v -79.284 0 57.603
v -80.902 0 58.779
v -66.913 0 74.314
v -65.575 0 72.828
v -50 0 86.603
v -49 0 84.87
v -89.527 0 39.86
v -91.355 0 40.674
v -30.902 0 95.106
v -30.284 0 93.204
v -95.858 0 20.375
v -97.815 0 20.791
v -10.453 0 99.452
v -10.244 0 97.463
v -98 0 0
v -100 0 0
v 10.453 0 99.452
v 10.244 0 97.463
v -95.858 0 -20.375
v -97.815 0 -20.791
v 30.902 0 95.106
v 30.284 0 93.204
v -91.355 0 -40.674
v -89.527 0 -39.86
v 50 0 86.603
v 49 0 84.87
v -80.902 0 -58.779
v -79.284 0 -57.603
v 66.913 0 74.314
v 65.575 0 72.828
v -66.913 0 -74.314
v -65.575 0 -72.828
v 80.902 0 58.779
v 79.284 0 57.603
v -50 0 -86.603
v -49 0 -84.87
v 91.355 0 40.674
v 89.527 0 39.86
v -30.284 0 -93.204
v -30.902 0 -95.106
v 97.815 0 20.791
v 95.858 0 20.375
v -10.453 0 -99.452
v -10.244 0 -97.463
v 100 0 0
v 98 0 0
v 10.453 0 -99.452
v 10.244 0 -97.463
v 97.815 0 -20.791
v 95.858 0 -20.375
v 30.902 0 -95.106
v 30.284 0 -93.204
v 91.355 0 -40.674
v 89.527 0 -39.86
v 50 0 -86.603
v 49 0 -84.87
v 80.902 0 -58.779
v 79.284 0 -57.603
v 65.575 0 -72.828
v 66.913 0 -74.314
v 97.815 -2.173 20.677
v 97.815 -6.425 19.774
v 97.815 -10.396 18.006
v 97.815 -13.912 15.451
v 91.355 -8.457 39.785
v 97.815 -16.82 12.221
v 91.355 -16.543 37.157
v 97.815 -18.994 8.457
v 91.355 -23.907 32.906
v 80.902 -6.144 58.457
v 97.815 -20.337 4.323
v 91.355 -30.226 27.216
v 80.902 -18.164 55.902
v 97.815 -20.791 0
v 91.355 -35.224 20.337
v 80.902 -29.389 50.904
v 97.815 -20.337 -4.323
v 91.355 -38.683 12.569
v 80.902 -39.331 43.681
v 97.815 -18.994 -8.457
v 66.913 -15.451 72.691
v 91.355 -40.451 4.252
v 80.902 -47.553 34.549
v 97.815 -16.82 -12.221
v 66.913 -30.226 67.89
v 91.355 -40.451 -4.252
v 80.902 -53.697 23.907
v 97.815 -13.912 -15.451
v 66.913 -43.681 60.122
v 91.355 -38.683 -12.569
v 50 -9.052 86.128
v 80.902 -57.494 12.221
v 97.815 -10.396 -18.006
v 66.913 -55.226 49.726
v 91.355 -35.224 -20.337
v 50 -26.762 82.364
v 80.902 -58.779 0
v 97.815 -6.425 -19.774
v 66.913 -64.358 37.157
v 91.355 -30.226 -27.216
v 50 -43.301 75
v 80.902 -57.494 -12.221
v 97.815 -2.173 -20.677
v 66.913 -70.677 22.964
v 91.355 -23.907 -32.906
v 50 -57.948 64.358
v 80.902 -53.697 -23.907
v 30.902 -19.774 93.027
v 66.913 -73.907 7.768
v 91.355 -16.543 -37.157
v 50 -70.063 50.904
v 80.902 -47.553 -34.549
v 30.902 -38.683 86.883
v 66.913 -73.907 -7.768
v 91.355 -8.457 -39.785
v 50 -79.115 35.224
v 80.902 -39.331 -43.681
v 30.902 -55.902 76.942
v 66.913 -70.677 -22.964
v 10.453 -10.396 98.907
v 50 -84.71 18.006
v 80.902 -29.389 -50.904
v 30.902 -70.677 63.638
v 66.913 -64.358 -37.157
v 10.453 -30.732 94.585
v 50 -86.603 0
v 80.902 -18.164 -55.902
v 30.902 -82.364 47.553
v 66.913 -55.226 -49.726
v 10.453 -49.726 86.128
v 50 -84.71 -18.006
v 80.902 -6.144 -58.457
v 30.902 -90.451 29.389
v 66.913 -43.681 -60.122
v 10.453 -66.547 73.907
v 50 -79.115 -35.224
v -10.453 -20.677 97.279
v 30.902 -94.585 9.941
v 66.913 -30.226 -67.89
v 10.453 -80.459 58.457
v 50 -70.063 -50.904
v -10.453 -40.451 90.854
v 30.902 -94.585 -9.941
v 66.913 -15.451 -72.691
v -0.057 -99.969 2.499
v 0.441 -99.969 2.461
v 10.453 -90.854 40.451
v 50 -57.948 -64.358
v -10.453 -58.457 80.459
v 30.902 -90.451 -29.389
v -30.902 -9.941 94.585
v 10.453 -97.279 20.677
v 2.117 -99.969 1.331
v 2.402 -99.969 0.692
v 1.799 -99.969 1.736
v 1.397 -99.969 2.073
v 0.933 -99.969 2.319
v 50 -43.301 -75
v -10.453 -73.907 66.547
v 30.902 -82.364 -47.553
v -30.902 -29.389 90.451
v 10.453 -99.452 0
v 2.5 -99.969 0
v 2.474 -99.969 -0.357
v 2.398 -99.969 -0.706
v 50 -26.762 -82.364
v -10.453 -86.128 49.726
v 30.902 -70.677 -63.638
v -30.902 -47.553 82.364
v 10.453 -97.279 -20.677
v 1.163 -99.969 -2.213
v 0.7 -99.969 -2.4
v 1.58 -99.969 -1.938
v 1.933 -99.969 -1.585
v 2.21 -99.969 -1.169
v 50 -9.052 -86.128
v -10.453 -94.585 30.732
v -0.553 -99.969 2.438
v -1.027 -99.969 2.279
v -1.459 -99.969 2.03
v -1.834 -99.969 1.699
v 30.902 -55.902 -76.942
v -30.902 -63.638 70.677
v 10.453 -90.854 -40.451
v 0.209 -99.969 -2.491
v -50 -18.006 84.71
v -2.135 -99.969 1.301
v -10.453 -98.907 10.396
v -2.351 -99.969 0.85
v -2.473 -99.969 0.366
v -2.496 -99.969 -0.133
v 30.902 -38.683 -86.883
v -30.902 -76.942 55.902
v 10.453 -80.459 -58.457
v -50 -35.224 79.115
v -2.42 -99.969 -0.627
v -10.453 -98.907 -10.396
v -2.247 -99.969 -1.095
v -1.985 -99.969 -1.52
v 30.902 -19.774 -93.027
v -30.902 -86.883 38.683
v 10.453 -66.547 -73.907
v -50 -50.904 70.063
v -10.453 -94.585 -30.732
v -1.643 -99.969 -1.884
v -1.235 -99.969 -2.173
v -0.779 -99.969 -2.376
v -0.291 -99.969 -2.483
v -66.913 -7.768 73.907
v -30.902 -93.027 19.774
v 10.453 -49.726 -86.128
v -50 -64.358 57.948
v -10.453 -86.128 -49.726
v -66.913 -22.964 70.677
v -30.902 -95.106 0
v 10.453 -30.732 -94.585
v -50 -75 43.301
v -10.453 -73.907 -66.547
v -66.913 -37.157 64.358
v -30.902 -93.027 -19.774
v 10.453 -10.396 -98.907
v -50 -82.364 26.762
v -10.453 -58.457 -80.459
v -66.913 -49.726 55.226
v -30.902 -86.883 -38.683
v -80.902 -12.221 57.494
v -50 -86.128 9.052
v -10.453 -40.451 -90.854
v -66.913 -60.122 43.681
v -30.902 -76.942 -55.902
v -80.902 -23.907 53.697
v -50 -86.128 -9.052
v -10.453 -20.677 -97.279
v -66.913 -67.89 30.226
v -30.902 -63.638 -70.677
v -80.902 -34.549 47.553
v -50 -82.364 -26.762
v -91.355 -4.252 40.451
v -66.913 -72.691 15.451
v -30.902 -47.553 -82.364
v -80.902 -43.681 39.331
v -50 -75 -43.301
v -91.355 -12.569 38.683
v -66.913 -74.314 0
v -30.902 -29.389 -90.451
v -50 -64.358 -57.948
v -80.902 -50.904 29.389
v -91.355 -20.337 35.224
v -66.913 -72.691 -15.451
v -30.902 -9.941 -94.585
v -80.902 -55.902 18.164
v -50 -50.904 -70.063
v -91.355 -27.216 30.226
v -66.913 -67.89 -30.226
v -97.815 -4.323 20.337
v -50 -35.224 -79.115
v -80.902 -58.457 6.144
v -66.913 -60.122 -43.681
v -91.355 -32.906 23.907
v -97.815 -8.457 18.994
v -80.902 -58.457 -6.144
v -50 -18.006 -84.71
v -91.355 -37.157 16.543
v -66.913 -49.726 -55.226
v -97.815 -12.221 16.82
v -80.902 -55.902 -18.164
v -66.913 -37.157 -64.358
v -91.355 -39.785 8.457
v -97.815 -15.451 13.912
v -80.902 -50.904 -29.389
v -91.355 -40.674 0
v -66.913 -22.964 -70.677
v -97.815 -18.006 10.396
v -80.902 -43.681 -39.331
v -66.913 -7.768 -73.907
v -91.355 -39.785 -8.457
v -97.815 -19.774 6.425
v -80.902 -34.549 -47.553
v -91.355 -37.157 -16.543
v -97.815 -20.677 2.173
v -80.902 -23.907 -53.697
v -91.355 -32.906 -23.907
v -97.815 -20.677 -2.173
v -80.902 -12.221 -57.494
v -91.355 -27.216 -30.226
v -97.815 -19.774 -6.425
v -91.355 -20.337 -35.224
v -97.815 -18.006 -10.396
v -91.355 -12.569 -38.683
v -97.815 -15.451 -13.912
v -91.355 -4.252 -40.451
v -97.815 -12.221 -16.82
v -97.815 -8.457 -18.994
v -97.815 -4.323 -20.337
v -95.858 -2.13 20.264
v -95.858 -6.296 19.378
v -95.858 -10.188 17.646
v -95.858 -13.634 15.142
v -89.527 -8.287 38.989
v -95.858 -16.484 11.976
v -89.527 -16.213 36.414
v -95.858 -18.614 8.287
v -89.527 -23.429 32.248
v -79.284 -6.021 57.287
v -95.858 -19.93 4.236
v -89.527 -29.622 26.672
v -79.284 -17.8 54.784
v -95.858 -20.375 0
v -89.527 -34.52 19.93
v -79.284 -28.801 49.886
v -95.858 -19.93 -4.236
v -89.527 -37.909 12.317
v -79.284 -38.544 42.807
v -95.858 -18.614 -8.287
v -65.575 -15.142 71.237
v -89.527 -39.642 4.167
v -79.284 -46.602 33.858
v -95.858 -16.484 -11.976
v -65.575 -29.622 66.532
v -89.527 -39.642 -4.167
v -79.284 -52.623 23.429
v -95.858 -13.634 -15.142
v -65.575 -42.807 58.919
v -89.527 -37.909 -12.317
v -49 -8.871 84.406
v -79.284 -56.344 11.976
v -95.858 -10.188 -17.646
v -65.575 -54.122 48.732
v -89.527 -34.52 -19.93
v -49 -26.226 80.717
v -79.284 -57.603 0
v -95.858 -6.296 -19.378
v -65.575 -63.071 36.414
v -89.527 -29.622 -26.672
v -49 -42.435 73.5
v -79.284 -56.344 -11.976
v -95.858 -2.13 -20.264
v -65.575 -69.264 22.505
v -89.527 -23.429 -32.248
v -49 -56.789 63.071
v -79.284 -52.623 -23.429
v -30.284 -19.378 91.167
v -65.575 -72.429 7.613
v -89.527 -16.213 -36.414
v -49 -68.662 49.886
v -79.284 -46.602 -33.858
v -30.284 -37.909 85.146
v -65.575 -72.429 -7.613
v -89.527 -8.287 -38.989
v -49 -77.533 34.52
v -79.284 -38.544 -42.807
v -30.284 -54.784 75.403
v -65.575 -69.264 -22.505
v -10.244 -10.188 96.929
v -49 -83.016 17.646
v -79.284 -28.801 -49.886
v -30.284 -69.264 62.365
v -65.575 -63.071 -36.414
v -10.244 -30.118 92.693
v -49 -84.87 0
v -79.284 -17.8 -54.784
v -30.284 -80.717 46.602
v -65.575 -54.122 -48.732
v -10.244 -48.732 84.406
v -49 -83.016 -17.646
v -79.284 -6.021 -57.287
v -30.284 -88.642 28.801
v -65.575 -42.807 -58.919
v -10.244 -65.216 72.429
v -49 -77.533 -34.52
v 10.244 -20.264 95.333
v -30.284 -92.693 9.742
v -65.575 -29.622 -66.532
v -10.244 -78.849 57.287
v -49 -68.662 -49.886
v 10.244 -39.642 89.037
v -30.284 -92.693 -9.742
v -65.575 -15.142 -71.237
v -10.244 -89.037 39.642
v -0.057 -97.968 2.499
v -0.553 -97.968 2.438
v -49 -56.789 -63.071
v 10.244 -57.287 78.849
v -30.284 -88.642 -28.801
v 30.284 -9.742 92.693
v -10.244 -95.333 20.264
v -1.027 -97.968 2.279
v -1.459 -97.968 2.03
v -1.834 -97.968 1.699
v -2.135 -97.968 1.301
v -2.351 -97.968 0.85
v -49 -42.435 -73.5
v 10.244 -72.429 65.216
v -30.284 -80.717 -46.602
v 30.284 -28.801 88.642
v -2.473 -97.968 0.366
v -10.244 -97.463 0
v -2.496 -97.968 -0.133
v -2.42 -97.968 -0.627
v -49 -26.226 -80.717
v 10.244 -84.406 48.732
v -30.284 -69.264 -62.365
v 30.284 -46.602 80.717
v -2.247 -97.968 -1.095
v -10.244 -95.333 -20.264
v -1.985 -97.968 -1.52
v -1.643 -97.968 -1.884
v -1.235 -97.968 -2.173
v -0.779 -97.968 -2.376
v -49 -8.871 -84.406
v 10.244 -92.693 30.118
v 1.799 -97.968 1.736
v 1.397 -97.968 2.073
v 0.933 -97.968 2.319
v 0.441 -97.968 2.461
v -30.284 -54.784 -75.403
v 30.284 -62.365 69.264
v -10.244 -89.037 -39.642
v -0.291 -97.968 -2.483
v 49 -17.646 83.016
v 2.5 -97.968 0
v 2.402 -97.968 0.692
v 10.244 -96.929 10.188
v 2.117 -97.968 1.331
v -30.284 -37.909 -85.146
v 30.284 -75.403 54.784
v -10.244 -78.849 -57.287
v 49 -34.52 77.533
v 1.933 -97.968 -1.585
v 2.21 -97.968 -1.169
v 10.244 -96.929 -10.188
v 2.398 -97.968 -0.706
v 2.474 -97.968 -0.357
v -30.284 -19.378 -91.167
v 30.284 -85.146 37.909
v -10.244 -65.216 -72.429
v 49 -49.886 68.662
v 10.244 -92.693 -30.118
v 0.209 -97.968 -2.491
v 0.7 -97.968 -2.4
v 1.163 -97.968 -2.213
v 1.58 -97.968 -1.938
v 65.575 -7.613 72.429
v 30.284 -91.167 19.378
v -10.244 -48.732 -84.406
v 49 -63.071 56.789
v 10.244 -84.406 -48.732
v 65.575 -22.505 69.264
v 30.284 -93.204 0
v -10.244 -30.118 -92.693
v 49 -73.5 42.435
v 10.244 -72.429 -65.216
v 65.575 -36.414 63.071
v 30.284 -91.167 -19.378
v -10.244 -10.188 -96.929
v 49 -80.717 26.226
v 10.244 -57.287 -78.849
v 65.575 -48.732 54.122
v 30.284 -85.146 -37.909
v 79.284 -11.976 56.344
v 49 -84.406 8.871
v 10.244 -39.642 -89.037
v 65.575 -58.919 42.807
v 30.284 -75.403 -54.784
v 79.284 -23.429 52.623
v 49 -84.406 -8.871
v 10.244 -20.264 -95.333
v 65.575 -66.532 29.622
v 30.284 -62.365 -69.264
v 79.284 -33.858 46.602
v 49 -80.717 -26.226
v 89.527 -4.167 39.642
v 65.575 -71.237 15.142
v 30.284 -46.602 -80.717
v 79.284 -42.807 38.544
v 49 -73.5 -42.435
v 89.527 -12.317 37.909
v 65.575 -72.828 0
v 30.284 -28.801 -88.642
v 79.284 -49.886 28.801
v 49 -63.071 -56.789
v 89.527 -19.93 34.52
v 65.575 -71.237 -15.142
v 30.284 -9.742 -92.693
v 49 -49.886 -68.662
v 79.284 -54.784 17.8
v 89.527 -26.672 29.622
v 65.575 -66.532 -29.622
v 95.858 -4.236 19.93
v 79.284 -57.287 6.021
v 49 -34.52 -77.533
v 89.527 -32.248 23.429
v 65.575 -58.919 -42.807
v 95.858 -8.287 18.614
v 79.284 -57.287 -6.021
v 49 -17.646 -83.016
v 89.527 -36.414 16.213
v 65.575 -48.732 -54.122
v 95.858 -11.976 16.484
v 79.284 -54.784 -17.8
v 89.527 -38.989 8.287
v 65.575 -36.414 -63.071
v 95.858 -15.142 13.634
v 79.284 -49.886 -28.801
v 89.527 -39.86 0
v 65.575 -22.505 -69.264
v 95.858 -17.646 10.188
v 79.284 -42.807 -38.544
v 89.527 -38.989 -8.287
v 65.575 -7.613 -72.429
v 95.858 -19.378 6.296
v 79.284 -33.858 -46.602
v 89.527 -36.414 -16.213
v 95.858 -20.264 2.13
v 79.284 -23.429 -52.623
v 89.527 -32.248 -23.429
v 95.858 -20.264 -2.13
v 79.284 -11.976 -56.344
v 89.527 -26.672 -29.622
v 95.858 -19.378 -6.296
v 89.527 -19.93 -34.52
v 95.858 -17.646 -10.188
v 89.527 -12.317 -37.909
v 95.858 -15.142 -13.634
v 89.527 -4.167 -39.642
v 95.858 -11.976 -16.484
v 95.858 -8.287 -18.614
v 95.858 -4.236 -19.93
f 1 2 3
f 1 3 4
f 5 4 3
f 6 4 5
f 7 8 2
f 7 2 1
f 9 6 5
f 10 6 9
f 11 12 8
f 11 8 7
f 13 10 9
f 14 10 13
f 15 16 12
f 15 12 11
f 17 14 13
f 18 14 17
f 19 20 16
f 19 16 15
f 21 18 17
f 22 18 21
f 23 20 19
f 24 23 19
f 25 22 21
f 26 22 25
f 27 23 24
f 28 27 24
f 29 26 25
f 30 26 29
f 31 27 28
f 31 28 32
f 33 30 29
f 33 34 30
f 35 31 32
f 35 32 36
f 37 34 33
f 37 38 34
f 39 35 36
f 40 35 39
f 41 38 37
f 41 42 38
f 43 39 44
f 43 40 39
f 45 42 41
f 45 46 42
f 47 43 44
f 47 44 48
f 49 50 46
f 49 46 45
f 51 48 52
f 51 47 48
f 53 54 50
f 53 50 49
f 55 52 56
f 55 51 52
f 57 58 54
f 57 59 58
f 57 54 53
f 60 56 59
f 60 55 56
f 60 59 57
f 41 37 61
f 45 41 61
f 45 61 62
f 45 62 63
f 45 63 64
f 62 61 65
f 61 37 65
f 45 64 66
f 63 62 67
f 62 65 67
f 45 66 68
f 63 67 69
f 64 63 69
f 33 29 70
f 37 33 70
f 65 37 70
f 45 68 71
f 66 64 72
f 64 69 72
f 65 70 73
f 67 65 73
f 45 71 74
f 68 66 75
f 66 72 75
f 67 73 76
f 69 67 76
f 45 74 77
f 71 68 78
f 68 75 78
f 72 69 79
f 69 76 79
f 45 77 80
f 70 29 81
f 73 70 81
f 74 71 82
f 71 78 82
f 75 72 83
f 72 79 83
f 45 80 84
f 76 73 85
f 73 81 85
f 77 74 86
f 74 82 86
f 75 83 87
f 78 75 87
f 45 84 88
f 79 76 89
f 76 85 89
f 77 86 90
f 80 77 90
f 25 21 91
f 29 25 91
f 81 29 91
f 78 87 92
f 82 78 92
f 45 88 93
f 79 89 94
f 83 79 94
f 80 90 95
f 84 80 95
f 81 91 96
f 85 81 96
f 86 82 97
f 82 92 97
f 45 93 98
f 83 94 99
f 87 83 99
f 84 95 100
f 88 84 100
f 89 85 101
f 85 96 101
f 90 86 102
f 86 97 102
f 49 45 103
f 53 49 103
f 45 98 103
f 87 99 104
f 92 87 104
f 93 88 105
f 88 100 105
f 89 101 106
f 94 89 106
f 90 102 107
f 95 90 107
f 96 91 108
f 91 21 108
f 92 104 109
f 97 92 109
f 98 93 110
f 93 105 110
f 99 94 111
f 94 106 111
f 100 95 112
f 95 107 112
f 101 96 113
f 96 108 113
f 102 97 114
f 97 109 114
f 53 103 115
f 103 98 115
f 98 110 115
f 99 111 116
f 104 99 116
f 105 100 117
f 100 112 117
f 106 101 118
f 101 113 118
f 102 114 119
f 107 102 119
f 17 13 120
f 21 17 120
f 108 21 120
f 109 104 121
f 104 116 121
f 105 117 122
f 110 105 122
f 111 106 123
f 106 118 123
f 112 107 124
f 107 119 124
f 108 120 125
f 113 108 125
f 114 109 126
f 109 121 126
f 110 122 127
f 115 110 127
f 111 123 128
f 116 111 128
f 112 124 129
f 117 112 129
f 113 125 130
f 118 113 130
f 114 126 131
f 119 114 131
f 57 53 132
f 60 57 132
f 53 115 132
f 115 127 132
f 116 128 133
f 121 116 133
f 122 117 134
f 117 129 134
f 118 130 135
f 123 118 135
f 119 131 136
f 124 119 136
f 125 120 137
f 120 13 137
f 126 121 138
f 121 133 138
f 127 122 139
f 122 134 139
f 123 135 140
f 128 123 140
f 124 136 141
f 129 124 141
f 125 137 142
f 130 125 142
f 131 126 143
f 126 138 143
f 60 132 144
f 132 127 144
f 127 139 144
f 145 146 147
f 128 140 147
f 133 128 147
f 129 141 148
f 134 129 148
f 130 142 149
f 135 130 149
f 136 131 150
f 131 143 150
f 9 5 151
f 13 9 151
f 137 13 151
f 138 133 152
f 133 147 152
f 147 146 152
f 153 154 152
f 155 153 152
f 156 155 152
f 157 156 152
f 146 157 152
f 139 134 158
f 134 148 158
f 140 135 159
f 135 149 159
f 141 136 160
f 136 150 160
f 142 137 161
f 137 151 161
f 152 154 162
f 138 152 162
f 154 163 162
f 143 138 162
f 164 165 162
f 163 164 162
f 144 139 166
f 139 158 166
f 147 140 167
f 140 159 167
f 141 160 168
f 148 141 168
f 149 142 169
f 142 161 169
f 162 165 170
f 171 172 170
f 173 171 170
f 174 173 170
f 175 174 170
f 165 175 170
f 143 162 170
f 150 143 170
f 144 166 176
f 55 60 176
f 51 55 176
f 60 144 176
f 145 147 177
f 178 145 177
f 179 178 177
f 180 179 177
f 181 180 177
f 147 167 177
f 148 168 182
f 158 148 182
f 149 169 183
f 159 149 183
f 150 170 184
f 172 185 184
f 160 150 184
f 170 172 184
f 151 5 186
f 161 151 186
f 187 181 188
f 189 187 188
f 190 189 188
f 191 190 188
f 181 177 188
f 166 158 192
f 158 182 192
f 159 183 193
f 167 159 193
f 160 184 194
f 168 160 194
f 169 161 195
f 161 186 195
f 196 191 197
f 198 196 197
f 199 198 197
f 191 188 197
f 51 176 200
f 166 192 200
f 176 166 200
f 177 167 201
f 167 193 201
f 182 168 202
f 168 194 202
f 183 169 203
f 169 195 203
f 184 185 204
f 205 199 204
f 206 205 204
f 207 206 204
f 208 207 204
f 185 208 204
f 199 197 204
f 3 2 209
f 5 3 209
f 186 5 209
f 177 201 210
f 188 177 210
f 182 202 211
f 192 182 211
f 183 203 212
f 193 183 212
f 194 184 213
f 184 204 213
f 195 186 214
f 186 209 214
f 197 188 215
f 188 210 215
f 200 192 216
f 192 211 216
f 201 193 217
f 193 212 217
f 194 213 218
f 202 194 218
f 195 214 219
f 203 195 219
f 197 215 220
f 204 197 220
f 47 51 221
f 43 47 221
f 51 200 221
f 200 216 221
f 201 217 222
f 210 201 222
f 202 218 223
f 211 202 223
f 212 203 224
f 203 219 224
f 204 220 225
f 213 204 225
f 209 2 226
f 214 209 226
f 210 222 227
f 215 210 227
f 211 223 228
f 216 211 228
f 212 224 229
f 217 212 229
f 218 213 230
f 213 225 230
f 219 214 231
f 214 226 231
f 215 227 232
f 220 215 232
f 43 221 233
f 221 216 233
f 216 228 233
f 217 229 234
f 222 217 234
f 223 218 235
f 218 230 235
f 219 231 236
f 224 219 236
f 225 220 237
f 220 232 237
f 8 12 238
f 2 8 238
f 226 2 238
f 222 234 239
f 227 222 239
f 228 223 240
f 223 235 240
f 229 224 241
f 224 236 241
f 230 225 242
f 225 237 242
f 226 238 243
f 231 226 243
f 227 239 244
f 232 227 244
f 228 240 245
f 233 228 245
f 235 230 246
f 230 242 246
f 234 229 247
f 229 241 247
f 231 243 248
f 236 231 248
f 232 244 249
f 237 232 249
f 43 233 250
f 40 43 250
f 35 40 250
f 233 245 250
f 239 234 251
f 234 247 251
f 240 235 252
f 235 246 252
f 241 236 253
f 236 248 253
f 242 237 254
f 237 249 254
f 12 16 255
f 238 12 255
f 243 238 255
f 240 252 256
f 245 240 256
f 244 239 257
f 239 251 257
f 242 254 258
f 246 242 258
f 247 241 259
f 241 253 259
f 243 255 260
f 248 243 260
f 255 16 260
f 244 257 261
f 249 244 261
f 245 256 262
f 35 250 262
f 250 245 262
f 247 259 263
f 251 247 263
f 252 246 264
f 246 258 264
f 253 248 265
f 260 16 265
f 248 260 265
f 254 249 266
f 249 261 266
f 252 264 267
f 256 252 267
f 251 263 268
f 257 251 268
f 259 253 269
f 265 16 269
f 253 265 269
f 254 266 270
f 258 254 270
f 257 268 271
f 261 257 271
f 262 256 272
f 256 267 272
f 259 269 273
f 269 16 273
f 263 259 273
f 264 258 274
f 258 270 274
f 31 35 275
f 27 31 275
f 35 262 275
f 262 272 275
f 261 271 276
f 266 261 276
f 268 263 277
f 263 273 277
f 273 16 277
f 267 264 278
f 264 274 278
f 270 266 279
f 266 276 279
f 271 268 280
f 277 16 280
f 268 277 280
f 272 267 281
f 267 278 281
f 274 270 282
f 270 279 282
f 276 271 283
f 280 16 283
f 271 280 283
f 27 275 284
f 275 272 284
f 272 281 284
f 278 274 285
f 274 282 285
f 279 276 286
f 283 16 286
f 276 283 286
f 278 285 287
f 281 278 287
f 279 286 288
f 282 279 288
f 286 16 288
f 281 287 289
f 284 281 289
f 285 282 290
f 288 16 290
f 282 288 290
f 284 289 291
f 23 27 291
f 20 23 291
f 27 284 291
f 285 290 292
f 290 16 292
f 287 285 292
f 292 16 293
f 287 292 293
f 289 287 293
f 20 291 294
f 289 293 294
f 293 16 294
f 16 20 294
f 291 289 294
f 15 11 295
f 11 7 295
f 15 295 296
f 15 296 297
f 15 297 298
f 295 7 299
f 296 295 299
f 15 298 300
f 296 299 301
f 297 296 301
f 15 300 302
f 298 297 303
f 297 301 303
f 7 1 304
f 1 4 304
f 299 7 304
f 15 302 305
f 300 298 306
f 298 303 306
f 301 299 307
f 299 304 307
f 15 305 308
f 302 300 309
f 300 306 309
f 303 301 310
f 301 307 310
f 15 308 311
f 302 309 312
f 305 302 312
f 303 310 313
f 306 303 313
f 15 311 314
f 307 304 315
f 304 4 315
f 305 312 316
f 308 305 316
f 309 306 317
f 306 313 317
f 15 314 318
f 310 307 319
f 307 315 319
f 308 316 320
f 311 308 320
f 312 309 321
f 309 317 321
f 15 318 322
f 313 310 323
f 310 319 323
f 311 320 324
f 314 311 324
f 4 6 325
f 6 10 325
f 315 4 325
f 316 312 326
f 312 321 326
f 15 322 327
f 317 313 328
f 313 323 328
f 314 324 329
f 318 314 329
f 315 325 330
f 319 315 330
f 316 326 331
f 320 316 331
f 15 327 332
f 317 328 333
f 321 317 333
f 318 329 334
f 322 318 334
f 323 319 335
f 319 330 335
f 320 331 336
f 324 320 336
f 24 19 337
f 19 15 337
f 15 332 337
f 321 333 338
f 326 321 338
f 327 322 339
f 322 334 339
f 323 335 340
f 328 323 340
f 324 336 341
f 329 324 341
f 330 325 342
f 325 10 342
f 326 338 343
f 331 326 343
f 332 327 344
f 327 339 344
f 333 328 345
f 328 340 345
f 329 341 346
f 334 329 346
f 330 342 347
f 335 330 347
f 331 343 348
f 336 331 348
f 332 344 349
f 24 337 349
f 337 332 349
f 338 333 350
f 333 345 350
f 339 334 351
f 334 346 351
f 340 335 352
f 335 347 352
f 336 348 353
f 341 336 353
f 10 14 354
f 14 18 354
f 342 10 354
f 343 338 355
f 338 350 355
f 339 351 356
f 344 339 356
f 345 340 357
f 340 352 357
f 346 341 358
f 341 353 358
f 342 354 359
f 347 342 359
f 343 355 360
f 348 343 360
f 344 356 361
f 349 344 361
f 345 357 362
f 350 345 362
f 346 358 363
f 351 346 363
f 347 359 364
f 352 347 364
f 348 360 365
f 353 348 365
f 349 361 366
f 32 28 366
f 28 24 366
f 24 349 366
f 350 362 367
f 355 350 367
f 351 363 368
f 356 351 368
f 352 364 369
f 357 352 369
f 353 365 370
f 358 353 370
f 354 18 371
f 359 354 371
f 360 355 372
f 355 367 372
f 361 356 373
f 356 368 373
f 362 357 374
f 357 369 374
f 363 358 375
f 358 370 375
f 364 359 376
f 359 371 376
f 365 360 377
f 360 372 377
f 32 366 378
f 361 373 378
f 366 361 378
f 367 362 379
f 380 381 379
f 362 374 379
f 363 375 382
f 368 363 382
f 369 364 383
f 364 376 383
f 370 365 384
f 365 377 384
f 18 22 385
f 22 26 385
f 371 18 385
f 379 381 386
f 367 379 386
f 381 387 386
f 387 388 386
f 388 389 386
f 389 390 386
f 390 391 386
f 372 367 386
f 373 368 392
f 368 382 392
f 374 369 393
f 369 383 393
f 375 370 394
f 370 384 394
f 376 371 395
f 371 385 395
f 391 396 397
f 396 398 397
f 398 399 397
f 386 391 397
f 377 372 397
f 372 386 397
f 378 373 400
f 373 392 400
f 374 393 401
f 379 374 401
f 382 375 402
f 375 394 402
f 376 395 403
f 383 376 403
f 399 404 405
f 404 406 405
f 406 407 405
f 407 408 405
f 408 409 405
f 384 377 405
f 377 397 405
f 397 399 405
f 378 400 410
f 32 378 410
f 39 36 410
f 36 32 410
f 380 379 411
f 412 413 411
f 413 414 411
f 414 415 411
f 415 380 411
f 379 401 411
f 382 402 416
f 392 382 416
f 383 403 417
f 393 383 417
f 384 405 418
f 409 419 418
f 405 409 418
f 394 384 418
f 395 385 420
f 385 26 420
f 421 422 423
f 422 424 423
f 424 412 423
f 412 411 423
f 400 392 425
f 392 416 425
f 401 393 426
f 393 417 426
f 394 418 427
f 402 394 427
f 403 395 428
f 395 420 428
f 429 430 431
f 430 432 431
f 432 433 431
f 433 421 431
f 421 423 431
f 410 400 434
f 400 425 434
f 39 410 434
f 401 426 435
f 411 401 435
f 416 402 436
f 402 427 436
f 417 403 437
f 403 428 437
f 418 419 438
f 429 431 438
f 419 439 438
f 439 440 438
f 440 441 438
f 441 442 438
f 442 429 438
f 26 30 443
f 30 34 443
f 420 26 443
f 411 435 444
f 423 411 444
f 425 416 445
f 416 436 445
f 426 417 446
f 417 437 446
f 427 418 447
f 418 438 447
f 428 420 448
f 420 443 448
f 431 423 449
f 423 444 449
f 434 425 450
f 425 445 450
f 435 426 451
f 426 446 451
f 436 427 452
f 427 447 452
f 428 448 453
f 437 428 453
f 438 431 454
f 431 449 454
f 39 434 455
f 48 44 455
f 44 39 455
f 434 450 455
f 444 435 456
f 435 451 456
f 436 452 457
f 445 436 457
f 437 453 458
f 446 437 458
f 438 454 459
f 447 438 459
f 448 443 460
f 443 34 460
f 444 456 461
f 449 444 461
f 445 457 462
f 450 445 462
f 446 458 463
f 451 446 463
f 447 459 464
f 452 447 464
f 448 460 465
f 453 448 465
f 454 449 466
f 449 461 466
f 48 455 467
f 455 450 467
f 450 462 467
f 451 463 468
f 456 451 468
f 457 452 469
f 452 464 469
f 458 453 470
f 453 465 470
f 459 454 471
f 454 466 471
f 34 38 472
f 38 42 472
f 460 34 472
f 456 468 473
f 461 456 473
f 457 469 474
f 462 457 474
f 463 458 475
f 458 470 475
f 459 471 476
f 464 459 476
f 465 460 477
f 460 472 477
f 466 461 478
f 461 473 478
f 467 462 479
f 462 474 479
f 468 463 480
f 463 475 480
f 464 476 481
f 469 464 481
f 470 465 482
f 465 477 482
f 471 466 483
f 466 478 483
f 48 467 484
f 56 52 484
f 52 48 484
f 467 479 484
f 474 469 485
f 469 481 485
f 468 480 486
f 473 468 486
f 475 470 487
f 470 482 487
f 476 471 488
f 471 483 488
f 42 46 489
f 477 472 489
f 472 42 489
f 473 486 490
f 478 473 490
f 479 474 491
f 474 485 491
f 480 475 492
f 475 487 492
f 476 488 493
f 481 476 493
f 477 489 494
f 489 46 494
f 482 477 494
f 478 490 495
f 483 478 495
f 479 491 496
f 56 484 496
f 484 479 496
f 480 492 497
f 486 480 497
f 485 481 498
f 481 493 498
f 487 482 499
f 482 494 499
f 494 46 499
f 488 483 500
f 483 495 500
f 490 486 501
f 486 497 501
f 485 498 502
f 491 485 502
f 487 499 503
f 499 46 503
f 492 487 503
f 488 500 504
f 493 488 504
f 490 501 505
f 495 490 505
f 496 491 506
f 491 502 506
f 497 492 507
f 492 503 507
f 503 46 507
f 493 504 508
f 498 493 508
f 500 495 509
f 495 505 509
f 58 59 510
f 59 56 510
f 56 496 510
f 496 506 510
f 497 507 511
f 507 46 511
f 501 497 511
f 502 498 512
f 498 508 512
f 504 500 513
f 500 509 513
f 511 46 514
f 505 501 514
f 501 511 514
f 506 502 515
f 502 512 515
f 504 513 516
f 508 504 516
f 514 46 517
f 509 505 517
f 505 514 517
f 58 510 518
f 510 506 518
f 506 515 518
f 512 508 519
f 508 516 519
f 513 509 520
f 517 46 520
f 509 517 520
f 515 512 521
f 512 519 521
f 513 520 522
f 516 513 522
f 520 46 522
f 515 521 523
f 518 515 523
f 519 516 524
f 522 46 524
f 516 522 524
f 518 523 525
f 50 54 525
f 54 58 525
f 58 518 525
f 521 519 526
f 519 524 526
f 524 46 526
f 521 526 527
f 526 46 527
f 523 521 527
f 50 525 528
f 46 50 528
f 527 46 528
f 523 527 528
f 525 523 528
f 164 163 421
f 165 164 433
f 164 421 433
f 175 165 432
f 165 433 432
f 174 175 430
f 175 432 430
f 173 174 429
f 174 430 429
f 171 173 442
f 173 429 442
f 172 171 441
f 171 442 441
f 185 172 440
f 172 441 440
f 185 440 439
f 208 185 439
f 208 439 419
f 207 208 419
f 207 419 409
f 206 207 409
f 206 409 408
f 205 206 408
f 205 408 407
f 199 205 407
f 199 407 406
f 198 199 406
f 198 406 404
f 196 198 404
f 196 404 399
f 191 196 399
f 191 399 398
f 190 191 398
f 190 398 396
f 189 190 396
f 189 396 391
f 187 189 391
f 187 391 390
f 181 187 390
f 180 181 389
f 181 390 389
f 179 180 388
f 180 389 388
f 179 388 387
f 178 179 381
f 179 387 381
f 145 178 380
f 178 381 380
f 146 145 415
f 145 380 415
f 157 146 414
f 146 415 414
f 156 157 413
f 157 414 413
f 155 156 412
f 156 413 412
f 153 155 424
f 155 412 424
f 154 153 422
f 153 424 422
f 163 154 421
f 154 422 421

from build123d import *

# Parameters (mm, degrees)
SKETCH_2_R          = 100
CUT_EXTRUDE_1_DEPTH = 101
SKETCH_3_R          = 2.5
CUT_EXTRUDE_2_DEPTH = 101


with BuildPart() as part:
    # 草图1 → 旋转1 (revolve)
    with BuildSketch(Plane.XY):
        with BuildLine():
            Line((-100, 0), (-98, 0))
            ThreePointArc((-98, 0), (0, -98), (98, 0))
            Line((98, 0), (100, 0))
            ThreePointArc((100, 0), (0, -100), (-100, 0))
        make_face()
    revolve(axis=Axis((-100, 0, 0), (1, 0, 0)))

    # 草图2 → 切除-拉伸1 (cut, through all)
    with BuildSketch(Plane(origin=(0, 0, 0), x_dir=(1, 0, 0), z_dir=(0, 1, 0))):
        Circle(SKETCH_2_R)
    extrude(amount=CUT_EXTRUDE_1_DEPTH, mode=Mode.SUBTRACT)

    # 草图3 → 切除-拉伸2 (cut, through all)
    with BuildSketch(Plane(origin=(0, 0, 0), x_dir=(1, 0, 0), z_dir=(0, 1, 0))):
        Circle(SKETCH_3_R)
    extrude(amount=-CUT_EXTRUDE_2_DEPTH, mode=Mode.SUBTRACT)


solid = part.part
